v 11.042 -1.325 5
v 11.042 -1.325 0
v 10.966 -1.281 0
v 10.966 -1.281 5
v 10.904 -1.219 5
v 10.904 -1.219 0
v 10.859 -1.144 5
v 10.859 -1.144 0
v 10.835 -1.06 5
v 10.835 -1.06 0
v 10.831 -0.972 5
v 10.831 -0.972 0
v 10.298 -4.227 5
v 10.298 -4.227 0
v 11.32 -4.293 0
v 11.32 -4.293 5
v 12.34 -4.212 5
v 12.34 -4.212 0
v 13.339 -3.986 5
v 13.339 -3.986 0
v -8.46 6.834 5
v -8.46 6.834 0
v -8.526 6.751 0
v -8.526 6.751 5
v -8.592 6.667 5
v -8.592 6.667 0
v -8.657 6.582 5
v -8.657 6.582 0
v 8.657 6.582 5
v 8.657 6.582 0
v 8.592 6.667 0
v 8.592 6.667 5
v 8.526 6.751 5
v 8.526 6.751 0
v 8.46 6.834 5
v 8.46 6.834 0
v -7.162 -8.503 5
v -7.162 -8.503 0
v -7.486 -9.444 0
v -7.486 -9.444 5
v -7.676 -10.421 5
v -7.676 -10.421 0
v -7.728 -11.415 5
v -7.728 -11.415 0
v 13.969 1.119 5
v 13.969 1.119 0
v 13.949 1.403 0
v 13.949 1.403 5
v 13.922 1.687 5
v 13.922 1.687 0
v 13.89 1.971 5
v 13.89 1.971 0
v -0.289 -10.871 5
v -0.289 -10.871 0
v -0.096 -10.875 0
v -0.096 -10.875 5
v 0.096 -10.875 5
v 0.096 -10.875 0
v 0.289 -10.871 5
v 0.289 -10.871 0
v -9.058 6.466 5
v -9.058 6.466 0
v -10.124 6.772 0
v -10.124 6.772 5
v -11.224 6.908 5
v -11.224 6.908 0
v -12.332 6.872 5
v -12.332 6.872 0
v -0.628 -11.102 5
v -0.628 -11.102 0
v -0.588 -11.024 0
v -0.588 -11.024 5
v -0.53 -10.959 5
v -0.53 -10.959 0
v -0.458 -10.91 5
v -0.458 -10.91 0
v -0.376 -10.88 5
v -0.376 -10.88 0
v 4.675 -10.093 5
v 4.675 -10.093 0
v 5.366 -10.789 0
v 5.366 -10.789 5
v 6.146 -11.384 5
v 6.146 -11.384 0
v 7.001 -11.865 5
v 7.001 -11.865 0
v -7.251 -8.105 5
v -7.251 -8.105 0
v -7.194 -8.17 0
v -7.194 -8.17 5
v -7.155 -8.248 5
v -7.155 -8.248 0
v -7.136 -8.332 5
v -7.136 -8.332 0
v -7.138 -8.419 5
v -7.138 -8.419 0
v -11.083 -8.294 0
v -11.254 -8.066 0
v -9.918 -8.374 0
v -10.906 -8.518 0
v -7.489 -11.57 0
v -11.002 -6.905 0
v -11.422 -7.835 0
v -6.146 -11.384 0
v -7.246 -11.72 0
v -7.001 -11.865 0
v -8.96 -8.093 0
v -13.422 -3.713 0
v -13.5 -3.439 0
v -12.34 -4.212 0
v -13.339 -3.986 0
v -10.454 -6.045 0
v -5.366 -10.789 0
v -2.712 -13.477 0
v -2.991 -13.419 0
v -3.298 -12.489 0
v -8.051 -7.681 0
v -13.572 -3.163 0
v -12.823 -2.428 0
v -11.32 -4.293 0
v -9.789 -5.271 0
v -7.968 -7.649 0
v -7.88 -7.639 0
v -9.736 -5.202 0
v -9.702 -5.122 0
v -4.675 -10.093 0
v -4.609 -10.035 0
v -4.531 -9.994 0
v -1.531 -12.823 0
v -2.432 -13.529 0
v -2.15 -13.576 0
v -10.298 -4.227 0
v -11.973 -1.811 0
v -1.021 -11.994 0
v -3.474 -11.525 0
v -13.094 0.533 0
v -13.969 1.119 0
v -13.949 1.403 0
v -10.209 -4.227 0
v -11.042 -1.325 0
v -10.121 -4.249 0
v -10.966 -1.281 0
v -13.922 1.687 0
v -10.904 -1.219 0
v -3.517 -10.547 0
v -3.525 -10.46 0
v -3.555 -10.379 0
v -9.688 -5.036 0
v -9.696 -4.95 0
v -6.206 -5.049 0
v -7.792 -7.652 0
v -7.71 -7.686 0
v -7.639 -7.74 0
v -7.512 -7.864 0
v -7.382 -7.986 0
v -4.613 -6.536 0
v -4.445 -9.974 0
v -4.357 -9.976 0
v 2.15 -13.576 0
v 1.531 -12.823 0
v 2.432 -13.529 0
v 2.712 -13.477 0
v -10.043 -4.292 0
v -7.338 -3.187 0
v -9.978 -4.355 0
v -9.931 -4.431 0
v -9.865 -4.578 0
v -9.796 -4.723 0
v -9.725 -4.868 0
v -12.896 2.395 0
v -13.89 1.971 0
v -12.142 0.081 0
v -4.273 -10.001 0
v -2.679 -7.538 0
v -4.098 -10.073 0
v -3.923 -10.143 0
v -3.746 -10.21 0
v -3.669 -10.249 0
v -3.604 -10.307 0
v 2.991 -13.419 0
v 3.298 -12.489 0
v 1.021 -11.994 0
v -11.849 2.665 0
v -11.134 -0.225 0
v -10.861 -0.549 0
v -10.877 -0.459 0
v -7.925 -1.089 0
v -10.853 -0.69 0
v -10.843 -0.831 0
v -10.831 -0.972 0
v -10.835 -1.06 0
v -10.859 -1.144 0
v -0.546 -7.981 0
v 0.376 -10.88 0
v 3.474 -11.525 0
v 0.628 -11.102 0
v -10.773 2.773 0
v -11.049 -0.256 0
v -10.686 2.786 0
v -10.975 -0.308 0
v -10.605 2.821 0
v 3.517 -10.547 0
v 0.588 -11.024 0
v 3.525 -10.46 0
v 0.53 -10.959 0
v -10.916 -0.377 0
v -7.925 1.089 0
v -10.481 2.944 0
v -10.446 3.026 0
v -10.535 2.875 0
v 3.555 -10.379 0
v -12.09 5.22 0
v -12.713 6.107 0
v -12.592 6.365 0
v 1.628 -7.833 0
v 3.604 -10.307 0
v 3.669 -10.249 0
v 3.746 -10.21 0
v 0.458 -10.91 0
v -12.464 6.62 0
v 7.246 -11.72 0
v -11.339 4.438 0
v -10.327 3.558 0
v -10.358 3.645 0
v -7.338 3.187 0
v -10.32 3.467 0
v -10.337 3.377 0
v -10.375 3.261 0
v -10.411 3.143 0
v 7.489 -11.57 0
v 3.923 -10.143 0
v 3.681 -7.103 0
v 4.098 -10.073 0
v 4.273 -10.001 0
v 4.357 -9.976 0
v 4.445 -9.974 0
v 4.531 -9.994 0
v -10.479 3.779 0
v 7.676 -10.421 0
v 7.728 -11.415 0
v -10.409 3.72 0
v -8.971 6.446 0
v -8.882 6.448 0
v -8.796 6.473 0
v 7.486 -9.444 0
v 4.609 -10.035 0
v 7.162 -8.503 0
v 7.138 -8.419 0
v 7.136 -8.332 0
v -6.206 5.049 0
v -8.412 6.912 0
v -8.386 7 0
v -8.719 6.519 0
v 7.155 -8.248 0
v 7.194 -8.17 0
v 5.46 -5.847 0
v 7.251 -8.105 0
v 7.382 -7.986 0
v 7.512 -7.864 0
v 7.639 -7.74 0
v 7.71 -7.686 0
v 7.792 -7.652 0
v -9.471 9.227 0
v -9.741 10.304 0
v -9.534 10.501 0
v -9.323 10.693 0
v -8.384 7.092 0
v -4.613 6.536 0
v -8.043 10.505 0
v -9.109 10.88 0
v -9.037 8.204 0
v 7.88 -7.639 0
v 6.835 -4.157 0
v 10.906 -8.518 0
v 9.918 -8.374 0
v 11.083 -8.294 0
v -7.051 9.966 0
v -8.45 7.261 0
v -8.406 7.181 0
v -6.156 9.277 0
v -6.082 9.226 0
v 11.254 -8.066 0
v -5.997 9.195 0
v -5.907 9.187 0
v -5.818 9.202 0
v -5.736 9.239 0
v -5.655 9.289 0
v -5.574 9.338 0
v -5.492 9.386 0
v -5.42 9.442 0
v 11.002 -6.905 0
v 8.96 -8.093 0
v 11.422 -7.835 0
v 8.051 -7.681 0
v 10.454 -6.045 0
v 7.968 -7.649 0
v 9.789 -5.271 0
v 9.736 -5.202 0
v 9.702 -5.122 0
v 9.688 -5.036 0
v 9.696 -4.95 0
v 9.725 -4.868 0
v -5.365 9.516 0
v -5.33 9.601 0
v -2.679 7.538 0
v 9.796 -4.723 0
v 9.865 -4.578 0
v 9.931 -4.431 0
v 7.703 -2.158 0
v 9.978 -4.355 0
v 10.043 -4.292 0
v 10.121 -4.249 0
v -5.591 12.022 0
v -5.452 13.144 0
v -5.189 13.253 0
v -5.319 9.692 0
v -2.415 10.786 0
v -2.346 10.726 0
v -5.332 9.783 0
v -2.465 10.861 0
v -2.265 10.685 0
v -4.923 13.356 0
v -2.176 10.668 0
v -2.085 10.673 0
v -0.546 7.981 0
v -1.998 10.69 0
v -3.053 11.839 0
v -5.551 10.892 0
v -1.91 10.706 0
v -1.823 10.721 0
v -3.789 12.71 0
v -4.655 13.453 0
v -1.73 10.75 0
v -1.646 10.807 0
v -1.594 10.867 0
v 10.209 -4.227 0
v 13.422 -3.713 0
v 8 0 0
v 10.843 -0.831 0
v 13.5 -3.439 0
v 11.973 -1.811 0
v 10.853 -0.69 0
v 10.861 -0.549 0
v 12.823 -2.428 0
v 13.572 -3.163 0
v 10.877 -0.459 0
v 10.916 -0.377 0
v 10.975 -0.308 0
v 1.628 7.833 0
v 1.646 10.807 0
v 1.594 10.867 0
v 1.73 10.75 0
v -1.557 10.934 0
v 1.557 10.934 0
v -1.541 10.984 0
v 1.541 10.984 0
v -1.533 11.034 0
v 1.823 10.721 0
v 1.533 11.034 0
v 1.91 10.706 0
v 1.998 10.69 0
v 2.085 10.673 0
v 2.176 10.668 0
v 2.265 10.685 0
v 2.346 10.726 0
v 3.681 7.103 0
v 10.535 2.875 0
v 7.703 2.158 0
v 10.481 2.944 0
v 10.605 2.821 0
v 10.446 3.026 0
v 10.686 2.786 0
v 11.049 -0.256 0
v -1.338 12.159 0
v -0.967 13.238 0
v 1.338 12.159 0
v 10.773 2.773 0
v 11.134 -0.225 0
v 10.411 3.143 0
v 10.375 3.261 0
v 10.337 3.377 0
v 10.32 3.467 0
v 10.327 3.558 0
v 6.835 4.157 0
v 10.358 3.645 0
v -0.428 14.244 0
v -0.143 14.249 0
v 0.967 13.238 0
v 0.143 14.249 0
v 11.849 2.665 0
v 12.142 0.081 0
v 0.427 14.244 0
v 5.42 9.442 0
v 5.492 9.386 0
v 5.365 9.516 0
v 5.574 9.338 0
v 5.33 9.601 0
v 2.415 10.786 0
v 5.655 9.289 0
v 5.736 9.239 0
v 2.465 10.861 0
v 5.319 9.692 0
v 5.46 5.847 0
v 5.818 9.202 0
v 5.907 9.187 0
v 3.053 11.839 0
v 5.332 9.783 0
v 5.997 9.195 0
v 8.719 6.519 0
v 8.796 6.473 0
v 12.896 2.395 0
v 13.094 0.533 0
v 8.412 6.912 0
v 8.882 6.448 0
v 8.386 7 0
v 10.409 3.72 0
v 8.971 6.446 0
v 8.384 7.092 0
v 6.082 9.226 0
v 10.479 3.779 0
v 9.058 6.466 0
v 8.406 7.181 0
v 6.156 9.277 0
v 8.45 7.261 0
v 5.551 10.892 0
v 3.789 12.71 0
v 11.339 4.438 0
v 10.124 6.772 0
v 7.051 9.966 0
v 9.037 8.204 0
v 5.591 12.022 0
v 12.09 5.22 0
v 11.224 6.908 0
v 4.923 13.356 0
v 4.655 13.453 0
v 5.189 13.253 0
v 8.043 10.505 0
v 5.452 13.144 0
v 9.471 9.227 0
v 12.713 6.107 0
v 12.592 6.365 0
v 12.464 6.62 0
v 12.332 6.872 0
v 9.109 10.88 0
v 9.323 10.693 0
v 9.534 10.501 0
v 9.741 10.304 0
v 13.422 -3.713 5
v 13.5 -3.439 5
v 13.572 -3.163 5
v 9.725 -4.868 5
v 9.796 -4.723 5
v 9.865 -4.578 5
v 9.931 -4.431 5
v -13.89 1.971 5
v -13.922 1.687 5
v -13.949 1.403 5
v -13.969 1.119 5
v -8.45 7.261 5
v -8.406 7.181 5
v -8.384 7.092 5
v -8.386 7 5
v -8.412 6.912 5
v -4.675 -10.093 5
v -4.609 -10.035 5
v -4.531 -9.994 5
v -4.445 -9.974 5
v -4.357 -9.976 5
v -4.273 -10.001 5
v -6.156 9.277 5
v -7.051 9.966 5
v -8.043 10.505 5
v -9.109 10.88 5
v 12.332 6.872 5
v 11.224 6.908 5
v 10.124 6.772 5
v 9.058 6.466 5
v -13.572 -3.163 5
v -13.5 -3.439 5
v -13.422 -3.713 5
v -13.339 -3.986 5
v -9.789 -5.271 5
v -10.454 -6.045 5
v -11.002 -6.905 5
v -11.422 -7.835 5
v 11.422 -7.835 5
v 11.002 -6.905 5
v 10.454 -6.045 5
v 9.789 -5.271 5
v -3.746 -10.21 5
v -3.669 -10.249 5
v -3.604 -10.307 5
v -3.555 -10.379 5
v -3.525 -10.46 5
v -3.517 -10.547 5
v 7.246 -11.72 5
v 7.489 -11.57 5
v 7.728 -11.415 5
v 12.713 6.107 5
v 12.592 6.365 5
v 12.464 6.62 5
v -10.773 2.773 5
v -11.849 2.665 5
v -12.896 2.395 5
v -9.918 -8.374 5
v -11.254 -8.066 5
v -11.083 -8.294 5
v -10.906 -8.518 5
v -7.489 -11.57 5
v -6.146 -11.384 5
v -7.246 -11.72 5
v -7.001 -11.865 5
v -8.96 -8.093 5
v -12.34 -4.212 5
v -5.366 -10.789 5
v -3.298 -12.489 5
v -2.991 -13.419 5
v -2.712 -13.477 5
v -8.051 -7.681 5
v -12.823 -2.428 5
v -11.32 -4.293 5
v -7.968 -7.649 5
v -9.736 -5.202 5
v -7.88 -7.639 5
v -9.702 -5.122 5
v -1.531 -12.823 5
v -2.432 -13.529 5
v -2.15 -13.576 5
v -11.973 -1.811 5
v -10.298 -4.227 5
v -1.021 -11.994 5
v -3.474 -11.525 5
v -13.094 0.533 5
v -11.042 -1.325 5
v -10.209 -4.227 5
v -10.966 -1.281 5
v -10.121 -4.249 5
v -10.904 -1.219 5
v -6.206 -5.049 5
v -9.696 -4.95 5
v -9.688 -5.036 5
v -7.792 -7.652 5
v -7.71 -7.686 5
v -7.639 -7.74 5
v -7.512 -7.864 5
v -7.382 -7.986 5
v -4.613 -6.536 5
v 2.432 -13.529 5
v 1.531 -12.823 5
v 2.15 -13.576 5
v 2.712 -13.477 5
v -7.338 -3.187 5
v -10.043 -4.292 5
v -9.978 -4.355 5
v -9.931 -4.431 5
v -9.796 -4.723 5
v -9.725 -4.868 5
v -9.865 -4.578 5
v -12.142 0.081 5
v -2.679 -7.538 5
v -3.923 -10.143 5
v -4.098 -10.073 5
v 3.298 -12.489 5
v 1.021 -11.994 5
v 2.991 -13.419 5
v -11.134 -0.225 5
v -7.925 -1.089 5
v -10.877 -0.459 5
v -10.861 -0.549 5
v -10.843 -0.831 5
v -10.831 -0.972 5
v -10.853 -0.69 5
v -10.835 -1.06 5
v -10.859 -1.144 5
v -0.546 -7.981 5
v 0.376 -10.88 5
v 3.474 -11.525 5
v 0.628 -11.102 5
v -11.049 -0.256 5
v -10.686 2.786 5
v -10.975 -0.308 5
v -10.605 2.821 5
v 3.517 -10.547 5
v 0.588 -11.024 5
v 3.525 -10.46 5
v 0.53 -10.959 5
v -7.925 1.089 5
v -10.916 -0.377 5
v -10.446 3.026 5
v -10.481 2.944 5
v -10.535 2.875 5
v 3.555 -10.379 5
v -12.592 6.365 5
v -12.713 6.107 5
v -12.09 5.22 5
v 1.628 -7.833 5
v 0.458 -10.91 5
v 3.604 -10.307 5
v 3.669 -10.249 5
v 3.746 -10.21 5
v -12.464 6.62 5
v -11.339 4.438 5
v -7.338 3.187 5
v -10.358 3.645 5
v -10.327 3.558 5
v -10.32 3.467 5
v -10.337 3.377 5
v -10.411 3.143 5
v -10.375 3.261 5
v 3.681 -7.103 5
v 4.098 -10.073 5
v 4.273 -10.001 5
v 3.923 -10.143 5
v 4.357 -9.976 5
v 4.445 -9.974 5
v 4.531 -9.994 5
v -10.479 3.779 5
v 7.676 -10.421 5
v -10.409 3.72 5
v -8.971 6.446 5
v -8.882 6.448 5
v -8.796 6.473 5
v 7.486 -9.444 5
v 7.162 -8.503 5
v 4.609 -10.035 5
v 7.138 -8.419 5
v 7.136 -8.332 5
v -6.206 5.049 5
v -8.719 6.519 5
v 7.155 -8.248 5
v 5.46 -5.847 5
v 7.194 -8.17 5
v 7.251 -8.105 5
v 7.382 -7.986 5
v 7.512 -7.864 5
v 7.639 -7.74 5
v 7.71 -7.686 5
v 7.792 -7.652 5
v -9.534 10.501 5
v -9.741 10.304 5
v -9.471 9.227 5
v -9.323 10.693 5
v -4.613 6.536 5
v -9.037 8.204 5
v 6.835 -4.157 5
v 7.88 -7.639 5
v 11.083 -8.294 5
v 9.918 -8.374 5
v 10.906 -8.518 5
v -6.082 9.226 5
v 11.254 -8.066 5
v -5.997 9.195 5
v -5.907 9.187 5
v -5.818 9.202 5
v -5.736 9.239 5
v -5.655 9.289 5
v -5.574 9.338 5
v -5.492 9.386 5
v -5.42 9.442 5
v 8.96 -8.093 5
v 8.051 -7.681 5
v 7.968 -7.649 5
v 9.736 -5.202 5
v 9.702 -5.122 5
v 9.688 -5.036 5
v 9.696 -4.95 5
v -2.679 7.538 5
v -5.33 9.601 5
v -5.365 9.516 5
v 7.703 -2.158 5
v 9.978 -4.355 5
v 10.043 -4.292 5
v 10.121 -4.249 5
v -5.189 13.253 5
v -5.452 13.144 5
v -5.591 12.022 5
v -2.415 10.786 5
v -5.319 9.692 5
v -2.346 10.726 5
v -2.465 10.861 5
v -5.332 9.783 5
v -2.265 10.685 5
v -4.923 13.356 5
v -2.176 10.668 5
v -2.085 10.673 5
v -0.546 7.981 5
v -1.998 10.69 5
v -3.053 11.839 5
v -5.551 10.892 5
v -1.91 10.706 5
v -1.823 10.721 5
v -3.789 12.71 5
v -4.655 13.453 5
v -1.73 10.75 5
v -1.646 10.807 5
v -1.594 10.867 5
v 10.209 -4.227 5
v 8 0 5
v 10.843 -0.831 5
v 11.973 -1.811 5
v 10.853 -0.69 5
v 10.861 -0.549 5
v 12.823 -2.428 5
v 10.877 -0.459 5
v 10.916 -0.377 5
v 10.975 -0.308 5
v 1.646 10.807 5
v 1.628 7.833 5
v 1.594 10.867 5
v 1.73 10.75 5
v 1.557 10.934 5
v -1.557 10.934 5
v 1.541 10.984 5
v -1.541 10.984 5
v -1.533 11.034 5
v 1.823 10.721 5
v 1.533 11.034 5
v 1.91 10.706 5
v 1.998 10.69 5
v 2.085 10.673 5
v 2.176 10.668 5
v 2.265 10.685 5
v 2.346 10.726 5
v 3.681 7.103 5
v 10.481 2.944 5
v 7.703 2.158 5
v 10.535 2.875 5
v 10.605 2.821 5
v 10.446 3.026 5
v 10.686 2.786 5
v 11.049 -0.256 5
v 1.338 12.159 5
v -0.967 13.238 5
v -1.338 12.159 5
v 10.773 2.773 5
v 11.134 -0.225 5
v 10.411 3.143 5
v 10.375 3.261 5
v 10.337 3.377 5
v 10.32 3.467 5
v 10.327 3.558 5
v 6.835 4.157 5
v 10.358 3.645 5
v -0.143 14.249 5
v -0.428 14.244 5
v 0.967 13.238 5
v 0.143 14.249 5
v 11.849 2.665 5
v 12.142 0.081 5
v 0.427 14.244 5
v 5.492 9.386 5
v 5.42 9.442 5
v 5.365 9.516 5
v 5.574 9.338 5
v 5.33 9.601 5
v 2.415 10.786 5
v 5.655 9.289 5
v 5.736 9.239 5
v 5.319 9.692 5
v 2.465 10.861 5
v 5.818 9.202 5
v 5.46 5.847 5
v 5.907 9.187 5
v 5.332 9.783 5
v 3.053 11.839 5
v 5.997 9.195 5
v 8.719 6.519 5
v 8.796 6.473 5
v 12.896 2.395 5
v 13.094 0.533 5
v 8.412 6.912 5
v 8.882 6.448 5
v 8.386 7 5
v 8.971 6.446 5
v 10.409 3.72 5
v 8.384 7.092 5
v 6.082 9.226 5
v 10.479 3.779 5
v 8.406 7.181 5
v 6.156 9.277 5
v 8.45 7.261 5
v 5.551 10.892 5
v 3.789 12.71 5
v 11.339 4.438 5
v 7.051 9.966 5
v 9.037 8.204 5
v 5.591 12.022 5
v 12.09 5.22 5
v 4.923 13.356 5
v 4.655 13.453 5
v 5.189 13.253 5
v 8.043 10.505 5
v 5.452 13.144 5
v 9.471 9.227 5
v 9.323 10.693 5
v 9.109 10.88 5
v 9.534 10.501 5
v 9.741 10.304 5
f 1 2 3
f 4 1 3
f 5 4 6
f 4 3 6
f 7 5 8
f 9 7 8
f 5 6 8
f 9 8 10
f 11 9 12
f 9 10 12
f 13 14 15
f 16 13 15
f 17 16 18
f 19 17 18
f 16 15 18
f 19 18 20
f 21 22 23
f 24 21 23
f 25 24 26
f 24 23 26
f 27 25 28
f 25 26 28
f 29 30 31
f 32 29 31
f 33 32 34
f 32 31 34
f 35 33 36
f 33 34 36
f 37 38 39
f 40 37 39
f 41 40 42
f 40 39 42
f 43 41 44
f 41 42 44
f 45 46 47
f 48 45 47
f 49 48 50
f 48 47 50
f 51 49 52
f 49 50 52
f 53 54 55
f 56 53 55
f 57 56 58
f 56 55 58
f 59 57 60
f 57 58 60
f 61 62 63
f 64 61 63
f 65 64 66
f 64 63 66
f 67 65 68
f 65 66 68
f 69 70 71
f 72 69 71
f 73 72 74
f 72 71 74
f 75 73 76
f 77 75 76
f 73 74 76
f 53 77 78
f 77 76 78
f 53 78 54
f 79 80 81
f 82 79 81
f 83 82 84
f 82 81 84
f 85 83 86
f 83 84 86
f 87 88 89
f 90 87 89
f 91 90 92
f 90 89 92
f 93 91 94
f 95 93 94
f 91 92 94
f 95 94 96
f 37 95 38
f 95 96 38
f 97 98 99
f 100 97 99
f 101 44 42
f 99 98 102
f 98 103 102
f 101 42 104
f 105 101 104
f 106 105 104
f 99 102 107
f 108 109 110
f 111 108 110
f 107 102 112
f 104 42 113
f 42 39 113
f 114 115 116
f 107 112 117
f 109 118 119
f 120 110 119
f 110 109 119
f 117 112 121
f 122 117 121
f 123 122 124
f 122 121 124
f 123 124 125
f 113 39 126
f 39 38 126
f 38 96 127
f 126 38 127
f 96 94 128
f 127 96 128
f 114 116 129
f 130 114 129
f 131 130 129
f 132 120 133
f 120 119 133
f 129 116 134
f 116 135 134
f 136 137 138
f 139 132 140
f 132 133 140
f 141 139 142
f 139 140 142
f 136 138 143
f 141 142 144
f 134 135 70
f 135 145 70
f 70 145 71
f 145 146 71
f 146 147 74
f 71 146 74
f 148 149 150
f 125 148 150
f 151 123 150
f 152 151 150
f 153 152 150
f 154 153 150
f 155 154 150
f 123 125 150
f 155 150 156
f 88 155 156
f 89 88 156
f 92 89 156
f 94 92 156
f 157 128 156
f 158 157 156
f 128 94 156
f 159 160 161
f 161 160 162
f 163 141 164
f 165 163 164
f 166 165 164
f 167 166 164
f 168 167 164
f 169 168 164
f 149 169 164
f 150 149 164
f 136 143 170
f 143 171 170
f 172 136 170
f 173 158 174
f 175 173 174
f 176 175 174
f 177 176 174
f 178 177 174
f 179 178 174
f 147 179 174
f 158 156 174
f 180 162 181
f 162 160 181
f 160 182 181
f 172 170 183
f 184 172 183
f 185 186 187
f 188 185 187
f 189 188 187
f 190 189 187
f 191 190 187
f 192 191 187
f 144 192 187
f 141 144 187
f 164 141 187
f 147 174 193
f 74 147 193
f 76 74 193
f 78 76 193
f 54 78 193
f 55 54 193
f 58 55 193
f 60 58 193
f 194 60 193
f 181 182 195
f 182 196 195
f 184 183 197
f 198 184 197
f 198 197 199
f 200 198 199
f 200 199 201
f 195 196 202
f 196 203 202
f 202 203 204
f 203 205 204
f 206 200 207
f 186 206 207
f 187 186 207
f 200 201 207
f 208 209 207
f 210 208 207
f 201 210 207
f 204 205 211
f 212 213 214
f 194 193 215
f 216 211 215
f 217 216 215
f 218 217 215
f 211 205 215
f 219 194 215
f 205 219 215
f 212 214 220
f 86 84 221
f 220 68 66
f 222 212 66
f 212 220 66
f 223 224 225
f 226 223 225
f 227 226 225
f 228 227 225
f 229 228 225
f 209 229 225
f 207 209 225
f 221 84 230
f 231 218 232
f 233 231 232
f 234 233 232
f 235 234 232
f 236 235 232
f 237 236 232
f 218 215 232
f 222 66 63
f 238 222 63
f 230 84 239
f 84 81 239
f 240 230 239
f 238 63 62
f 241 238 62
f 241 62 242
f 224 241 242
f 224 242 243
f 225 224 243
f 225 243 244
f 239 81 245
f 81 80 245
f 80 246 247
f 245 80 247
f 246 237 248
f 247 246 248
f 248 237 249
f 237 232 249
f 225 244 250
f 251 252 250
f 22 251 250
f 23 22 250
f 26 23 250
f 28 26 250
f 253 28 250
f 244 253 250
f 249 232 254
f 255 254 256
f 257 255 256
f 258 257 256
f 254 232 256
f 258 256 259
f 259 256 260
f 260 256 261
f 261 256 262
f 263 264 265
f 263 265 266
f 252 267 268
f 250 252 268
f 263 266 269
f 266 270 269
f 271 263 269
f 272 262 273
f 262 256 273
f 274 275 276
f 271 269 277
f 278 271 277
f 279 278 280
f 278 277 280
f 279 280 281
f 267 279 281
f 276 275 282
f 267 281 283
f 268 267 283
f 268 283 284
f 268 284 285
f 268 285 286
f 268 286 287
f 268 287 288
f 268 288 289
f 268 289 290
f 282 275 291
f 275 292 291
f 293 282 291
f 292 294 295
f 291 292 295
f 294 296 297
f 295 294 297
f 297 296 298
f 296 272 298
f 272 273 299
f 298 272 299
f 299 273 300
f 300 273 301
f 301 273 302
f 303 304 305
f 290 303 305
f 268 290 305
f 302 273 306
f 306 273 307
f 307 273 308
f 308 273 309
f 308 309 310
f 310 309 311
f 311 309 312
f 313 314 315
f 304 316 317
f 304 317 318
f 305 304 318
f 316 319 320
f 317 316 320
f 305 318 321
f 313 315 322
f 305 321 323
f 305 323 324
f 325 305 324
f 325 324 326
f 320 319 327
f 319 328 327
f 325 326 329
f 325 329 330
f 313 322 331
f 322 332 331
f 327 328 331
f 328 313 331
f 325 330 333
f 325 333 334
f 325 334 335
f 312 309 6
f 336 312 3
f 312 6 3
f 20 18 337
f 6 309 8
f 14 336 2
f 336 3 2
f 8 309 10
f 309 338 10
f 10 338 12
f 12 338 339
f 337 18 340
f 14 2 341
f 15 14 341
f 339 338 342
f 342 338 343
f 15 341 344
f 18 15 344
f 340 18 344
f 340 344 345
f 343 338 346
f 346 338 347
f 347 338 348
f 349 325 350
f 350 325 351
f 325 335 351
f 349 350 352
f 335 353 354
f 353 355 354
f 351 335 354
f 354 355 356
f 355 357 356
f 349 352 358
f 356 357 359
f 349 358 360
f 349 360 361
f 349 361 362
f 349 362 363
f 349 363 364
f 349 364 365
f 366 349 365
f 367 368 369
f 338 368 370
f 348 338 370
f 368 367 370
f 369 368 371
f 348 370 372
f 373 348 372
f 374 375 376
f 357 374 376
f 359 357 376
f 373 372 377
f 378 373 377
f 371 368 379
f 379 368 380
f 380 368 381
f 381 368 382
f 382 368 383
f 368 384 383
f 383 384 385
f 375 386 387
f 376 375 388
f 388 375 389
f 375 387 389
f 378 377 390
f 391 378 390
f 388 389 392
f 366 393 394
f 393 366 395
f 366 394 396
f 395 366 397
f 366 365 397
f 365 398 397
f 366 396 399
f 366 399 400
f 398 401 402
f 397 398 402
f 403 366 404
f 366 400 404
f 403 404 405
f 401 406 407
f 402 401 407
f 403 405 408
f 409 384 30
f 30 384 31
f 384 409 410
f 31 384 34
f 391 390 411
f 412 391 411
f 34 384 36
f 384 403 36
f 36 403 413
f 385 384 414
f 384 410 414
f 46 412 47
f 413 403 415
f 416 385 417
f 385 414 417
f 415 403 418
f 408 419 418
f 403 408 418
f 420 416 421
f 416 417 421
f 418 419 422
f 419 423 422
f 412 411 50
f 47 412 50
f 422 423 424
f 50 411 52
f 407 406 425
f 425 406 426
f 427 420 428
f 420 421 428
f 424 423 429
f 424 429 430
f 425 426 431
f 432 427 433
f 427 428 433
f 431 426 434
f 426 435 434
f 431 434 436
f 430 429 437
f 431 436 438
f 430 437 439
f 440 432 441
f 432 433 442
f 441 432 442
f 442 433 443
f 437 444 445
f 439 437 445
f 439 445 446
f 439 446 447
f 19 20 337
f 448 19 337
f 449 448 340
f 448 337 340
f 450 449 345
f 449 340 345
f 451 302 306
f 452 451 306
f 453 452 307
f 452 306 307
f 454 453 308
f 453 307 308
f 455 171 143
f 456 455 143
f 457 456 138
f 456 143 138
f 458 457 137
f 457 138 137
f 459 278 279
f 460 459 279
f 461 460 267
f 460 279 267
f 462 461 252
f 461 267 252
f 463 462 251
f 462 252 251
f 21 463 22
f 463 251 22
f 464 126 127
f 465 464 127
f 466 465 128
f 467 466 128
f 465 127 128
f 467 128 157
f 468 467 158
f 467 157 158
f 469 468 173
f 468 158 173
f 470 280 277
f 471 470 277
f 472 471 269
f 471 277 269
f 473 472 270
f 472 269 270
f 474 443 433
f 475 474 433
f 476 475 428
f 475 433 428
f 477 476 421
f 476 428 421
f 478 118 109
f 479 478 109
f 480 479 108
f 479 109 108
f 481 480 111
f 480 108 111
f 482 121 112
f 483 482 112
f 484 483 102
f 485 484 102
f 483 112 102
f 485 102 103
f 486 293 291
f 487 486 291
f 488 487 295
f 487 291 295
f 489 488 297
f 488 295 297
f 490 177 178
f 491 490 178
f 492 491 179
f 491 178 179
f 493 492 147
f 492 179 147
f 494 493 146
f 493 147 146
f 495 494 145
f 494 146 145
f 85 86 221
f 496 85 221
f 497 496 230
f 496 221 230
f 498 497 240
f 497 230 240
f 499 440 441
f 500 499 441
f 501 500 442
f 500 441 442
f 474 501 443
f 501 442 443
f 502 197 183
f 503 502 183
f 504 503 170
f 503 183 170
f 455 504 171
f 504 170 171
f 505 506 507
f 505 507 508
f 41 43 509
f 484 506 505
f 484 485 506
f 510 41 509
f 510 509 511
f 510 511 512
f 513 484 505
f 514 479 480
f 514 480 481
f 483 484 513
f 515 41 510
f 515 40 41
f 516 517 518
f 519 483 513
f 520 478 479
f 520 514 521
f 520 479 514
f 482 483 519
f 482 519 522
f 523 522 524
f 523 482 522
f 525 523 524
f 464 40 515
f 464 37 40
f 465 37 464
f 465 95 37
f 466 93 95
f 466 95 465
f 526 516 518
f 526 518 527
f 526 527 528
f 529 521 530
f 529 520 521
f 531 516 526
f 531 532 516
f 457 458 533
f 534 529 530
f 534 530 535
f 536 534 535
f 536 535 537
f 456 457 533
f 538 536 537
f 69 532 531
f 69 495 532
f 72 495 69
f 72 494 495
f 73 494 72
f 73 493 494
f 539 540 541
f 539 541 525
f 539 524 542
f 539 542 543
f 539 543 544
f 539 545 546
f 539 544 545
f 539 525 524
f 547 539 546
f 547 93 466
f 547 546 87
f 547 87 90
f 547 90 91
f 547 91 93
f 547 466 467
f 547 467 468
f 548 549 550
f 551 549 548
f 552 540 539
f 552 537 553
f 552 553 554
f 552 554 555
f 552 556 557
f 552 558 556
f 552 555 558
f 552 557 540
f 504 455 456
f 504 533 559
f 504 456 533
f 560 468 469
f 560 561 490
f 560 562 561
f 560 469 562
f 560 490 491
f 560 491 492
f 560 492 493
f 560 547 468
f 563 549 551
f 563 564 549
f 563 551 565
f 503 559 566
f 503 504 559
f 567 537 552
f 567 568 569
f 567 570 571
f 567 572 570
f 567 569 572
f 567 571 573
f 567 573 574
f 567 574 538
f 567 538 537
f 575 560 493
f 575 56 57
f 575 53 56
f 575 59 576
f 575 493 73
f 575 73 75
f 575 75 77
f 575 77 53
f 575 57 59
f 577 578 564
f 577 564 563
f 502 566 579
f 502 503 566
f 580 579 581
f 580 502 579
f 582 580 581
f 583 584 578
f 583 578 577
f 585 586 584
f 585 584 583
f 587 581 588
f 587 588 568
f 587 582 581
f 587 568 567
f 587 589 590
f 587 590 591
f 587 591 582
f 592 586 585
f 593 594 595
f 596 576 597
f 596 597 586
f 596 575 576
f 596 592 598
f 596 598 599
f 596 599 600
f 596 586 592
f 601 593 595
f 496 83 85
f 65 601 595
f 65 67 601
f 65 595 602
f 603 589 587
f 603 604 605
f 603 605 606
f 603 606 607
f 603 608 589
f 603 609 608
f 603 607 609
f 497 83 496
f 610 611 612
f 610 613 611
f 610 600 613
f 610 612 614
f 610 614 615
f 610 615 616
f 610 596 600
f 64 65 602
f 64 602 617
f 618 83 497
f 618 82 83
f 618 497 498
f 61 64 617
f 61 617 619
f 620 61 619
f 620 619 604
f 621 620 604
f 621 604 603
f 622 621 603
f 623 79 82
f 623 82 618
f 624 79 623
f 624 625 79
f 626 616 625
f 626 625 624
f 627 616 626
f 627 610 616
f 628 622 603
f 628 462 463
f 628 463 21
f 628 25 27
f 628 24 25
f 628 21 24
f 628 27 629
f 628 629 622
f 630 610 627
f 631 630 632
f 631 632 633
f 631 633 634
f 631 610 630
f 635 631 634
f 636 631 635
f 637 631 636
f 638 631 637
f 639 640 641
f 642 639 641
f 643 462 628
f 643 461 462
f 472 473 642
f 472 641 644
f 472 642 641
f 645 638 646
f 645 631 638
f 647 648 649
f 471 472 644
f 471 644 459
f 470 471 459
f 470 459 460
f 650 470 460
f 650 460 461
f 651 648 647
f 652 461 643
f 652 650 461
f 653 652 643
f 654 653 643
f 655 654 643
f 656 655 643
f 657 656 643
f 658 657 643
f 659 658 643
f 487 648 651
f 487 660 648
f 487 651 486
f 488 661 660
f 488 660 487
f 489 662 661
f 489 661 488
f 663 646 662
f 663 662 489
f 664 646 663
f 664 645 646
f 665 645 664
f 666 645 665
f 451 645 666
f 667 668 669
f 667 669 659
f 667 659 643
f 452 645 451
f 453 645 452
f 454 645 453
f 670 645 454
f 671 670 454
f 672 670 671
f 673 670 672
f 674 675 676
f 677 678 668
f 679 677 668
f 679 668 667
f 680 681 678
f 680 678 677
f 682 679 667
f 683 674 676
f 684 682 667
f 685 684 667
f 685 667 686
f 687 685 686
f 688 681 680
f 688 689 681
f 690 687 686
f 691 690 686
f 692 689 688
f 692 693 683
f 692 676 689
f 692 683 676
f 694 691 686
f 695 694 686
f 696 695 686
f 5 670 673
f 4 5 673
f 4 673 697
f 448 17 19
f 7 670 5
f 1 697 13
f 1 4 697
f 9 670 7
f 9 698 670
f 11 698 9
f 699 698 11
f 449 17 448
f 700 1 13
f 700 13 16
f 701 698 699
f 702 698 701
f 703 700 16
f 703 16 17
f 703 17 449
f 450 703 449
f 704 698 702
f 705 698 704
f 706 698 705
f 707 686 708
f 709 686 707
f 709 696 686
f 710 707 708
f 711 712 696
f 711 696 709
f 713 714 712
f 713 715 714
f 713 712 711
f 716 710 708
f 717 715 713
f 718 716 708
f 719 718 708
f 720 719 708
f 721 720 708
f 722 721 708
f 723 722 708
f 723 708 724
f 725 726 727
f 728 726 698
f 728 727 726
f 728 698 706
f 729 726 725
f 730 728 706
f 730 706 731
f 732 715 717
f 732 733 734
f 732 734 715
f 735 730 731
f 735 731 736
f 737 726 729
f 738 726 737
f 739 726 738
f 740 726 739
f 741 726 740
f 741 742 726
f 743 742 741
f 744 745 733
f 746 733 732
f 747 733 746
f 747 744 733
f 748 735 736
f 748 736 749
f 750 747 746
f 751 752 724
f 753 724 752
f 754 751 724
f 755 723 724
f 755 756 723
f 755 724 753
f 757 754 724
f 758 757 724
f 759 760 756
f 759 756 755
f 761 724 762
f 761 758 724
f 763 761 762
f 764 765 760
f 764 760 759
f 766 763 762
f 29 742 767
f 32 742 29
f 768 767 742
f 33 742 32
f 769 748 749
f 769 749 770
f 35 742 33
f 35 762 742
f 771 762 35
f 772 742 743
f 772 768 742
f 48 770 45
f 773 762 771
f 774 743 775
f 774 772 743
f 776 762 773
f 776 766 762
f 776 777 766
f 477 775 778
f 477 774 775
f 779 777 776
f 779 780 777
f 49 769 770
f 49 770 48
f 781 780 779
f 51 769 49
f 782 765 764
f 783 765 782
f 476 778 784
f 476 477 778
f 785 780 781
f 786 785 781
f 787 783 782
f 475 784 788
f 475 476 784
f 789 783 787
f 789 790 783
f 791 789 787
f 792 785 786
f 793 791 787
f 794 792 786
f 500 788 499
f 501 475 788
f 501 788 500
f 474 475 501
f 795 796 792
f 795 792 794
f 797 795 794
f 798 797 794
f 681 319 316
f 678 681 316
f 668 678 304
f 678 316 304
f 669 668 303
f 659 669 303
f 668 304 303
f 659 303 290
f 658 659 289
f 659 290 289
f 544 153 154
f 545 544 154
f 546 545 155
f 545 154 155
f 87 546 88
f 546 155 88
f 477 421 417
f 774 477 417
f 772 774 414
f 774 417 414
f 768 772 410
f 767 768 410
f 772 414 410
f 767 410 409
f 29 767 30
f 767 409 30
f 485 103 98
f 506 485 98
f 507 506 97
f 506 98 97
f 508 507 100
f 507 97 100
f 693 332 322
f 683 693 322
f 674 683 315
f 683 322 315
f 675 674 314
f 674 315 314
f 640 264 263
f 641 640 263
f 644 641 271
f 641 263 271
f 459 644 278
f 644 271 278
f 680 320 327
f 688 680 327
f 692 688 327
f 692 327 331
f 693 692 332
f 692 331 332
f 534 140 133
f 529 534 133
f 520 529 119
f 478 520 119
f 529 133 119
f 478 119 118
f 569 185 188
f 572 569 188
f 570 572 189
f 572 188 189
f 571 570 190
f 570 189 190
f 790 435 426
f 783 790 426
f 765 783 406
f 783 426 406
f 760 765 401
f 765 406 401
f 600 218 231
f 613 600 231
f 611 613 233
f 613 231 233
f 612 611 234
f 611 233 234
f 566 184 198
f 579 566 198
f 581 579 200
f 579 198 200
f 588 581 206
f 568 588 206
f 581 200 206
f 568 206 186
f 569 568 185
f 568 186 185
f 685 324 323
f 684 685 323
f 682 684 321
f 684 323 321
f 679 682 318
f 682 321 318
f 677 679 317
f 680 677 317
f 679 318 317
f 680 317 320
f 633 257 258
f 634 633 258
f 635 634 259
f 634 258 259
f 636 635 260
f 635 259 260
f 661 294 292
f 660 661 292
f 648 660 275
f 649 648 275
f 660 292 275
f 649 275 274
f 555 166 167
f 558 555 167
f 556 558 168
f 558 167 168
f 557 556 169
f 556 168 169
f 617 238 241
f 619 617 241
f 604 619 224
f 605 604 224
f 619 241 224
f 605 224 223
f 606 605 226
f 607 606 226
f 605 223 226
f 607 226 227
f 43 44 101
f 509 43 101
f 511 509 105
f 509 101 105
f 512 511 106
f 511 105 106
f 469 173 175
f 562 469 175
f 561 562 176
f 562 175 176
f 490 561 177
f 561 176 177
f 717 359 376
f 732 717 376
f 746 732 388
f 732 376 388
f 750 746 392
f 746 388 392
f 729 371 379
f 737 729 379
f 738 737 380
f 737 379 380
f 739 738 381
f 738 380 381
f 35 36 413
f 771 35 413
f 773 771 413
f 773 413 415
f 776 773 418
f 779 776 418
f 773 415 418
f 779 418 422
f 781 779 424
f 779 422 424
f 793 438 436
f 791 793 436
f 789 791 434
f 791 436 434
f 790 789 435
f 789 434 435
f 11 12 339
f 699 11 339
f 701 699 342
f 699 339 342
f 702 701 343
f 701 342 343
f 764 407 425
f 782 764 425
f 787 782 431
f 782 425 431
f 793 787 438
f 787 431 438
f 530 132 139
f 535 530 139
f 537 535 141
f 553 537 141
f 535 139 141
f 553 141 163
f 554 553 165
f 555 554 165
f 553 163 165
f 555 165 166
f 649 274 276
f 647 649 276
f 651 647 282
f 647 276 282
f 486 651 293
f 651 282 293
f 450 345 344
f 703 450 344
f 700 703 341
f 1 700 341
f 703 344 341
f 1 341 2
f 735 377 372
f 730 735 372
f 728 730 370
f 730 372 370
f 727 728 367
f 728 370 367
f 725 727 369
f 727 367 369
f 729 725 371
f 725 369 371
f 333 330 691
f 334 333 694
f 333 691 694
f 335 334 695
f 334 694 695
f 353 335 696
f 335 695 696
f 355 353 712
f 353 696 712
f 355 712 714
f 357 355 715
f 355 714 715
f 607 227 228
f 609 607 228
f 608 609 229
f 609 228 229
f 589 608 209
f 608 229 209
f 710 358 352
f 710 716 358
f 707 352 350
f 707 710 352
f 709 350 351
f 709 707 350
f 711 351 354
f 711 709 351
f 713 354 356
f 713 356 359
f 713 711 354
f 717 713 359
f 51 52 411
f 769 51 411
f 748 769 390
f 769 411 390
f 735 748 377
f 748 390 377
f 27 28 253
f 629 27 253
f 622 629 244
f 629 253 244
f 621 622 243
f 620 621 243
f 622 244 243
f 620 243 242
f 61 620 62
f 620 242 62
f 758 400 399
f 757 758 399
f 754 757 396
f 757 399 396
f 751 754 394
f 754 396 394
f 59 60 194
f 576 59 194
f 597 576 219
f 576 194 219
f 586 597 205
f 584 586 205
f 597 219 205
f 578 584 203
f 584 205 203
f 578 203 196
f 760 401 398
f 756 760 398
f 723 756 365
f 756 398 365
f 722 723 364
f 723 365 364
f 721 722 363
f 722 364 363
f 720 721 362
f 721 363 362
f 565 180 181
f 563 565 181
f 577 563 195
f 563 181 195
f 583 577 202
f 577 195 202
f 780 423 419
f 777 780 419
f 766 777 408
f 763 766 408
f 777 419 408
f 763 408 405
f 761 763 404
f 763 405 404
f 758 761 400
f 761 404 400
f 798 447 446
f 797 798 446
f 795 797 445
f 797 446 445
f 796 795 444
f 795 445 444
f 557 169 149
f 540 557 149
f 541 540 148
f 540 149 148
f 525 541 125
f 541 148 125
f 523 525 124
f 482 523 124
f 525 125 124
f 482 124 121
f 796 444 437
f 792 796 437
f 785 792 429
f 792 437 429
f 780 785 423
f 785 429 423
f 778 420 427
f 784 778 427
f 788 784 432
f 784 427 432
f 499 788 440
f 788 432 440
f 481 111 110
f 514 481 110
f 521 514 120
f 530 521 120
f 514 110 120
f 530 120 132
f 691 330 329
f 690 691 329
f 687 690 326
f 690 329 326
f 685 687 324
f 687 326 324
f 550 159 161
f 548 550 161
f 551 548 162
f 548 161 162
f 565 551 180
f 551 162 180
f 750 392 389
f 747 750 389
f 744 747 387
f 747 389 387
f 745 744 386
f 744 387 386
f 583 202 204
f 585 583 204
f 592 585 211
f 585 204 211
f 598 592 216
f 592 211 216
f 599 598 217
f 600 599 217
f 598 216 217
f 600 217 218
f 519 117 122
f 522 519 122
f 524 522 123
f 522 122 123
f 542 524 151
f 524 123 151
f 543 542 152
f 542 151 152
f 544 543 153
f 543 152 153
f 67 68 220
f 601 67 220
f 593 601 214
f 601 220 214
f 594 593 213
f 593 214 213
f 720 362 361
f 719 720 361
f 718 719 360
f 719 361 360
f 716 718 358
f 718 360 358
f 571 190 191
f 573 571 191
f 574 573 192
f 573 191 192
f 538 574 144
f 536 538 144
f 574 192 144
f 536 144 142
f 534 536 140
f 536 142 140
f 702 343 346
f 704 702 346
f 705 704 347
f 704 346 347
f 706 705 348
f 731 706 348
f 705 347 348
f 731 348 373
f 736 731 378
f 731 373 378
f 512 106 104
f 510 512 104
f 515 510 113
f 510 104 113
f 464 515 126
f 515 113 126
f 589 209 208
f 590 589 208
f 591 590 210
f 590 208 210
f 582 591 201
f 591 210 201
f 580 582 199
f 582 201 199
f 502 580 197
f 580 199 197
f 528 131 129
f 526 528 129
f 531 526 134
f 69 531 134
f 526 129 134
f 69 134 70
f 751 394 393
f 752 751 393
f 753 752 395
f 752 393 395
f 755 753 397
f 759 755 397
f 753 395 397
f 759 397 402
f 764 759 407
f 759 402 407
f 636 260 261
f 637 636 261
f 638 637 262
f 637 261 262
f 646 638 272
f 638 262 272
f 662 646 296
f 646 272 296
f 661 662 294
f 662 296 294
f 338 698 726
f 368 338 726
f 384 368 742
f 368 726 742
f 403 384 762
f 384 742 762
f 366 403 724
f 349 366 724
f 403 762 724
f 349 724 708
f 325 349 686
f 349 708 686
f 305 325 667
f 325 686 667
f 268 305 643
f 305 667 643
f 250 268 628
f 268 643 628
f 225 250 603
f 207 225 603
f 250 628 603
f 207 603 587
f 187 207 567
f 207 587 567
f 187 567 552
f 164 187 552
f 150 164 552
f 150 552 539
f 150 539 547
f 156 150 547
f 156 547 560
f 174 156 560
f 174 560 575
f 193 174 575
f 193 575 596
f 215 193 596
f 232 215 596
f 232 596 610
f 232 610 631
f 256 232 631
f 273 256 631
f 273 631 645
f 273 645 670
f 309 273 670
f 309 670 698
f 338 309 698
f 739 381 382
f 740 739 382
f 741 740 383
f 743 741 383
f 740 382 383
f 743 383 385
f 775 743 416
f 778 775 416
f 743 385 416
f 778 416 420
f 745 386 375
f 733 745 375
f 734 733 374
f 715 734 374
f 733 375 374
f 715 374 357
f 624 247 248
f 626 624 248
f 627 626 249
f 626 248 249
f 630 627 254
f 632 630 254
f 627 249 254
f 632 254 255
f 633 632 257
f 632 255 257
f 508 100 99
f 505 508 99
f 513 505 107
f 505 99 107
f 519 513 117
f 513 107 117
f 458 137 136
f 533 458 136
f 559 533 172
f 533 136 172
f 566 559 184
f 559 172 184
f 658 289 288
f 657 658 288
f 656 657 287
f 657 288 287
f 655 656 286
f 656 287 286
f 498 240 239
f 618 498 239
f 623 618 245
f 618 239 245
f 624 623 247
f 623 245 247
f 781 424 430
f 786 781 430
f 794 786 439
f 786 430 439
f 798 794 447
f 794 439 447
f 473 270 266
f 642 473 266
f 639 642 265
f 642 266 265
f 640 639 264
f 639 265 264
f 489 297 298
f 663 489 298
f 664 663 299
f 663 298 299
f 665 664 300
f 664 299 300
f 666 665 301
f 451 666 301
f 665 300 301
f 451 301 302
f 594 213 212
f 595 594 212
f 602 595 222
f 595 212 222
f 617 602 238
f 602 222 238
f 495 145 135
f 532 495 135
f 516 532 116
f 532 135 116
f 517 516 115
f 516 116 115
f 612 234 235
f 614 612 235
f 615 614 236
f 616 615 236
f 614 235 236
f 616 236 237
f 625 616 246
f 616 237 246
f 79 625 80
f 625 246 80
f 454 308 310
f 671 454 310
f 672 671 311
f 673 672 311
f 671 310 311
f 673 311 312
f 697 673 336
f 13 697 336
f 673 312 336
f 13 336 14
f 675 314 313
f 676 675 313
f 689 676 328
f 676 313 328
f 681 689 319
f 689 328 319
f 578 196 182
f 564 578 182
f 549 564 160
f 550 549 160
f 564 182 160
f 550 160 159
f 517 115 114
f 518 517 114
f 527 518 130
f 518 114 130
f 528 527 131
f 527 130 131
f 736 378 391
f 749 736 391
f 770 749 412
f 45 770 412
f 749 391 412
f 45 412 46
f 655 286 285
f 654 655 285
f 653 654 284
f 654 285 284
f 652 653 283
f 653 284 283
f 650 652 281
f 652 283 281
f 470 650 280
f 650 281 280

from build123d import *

# Parameters (mm, degrees)
SKETCH_1_R               = 10.875
EXTRUDE_1_DEPTH          = 5
EXTRUDE_2_DEPTH          = 5
FILLET_1_R               = 0.35
PATTERN_CIRCULAR_1_DEPTH = 5
CUT_EXTRUDE_1_REACH      = 22.572
SKETCH_2_R               = 8


# Read off the part's stored shape, not the designer's step: 원형 패턴1
with BuildPart() as part:
    # 스케치1 → 보스-돌출1 (new body)
    with BuildSketch(Plane.XY):
        Circle(SKETCH_1_R)
    extrude(amount=EXTRUDE_1_DEPTH)

    # 스케치1<3> → 보스-돌출2 (add)
    with BuildSketch(Plane.XY):
        with BuildLine():
            ThreePointArc((1.5525, 10.763613183), (1.216970842, 12.576974386), (0.4275, 14.243586057))
            ThreePointArc((0.4275, 14.243586057), (0, 14.25), (-0.4275, 14.243586057))
            ThreePointArc((-0.4275, 14.243586057), (-1.216970842, 12.576974386), (-1.5525, 10.763613183))
            ThreePointArc((-1.5525, 10.763613183), (0, 10.875), (1.5525, 10.763613183))
        make_face()
    extrude(amount=EXTRUDE_2_DEPTH)

    # 필렛1
    fillet_1_edges = [part.edges().sort_by_distance(p)[0] for p in [
        (-1.5525, 10.763613183, 2.5),
        (1.5525, 10.763613183, 2.5),
    ]]
    fillet(fillet_1_edges, radius=FILLET_1_R)

    # 원형 패턴1 outline → 원형 패턴1 (add)
    with BuildSketch(Plane.XY):
        with BuildLine():
            ThreePointArc((2.084837088, 10.673288121), (3.842906104, 10.173381821), (5.492422476, 9.386102511))
            ThreePointArc((5.492422476, 9.386102511), (5.344646109, 9.557145045), (5.332233471, 9.782842475))
            ThreePointArc((5.332233471, 9.782842475), (5.593355494, 11.4564781), (5.452236305, 13.144472855))
            ThreePointArc((5.452236305, 13.144472855), (5.055921411, 13.304884491), (4.654972549, 13.453334479))
            ThreePointArc((4.654972549, 13.453334479), (3.403689946, 12.289385973), (2.465385752, 10.861075951))
            ThreePointArc((2.465385752, 10.861075951), (2.306817266, 10.702930709), (2.084837088, 10.673288121))
        make_face()
        with BuildLine():
            ThreePointArc((5.736195698, 9.2391387), (7.199095251, 8.150990895), (8.459646862, 6.833739823))
            ThreePointArc((8.459646862, 6.833739823), (8.381997736, 7.045900933), (8.450146114, 7.261301773))
            ThreePointArc((8.450146114, 7.261301773), (9.274201483, 8.707038787), (9.740617886, 10.304436202))
            ThreePointArc((9.740617886, 10.304436202), (9.42901262, 10.597181051), (9.108765262, 10.880445977))
            ThreePointArc((9.108765262, 10.880445977), (7.536352291, 10.255192371), (6.155612256, 9.27693802))
            ThreePointArc((6.155612256, 9.27693802), (5.952224819, 9.187903085), (5.736195698, 9.2391387))
        make_face()
        with BuildLine():
            ThreePointArc((8.656847778, 6.582143386), (9.631277253, 5.050160738), (10.337248772, 3.377412148))
            ThreePointArc((10.337248772, 3.377412148), (10.339832595, 3.602419922), (10.478866532, 3.779351375))
            ThreePointArc((10.478866532, 3.779351375), (11.729603042, 4.815098477), (12.713475046, 6.107038785))
            ThreePointArc((12.713475046, 6.107038785), (12.528663426, 6.492580033), (12.332368752, 6.872403399))
            ThreePointArc((12.332368752, 6.872403399), (10.671238348, 6.86130469), (9.057778331, 6.466052652))
            ThreePointArc((9.057778331, 6.466052652), (8.838113972, 6.457792134), (8.656847778, 6.582143386))
        make_face()
        with BuildLine():
            ThreePointArc((10.44566348, 3.025514743), (10.802249116, 1.255802147), (10.861158072, -0.548516485))
            ThreePointArc((10.861158072, -0.548516485), (10.943077602, -0.34062274), (11.134084318, -0.224661311))
            ThreePointArc((11.134084318, -0.224661311), (12.626546762, 0.289328326), (13.969306954, 1.119162384))
            ThreePointArc((13.969306954, 1.119162384), (13.936248813, 1.545430549), (13.890417506, 1.970515105))
            ThreePointArc((13.890417506, 1.970515105), (12.377771936, 2.549980076), (10.773358461, 2.772990553))
            ThreePointArc((10.773358461, 2.772990553), (10.568207288, 2.845653785), (10.44566348, 3.025514743))
        make_face()
        with BuildLine():
            ThreePointArc((10.831434222, -0.972449329), (10.524388312, -2.739137757), (9.931200049, -4.431353133))
            ThreePointArc((9.931200049, -4.431353133), (10.080749628, -4.26807205), (10.298365111, -4.227215102))
            ThreePointArc((10.298365111, -4.227215102), (11.831510548, -4.270865326), (13.338506551, -3.985552654))
            ThreePointArc((13.338506551, -3.985552654), (13.461666574, -3.57612745), (13.572488407, -3.163191729))
            ThreePointArc((13.572488407, -3.163191729), (12.409057254, -2.103647039), (11.041512467, -1.325168872))
            ThreePointArc((11.041512467, -1.325168872), (10.879326869, -1.182845296), (10.831434222, -0.972449329))
        make_face()
        with BuildLine():
            ThreePointArc((9.724818044, -4.867600951), (8.799895988, -6.389636578), (7.638946645, -7.74029193))
            ThreePointArc((7.638946645, -7.74029193), (7.835322049, -7.642919348), (8.051101932, -7.68143897))
            ThreePointArc((8.051101932, -7.68143897), (9.434573038, -8.250170344), (10.906266927, -8.517686277))
            ThreePointArc((10.906266927, -8.517686277), (11.169011671, -8.180399177), (11.421519541, -7.835381548))
            ThreePointArc((11.421519541, -7.835381548), (10.743744256, -6.465085659), (9.78938361, -5.27081353))
            ThreePointArc((9.78938361, -5.27081353), (9.692203368, -5.079599132), (9.724818044, -4.867600951))
        make_face()
        with BuildLine():
            ThreePointArc((7.250855805, -8.104980882), (5.839114845, -9.174440736), (4.272503154, -10.000567074))
            ThreePointArc((4.272503154, -10.000567074), (4.488726043, -9.981391229), (4.674670149, -10.09339498))
            ThreePointArc((4.674670149, -10.09339498), (5.746046713, -11.099844355), (7.00107552, -11.865148727))
            ThreePointArc((7.00107552, -11.865148727), (7.367919852, -11.645552222), (7.728011172, -11.415049228))
            ThreePointArc((7.728011172, -11.415049228), (7.598229184, -9.929070664), (7.162058655, -8.502630716))
            ThreePointArc((7.162058655, -8.502630716), (7.142629708, -8.289552802), (7.250855805, -8.104980882))
        make_face()
        with BuildLine():
            ThreePointArc((3.745858716, -10.209513577), (2.04453627, -10.681081239), (0.289330355, -10.871150489))
            ThreePointArc((0.289330355, -10.871150489), (0.495925275, -10.93192564), (0.627834307, -11.102146342))
            ThreePointArc((0.627834307, -11.102146342), (1.261761796, -12.417365945), (2.150350071, -13.57584665))
            ThreePointArc((2.150350071, -13.57584665), (2.57174963, -13.503598465), (2.990792071, -13.418740812))
            ThreePointArc((2.990792071, -13.418740812), (3.40225572, -12.010026536), (3.516526006, -10.546906395))
            ThreePointArc((3.516526006, -10.546906395), (3.576953157, -10.341342504), (3.745858716, -10.209513577))
        make_face()
        with BuildLine():
            ThreePointArc((-0.289330355, -10.871150489), (-2.04453627, -10.681081239), (-3.745858716, -10.209513577))
            ThreePointArc((-3.745858716, -10.209513577), (-3.576953157, -10.341342504), (-3.516526006, -10.546906395))
            ThreePointArc((-3.516526006, -10.546906395), (-3.40225572, -12.010026536), (-2.990792071, -13.418740812))
            ThreePointArc((-2.990792071, -13.418740812), (-2.57174963, -13.503598465), (-2.150350071, -13.57584665))
            ThreePointArc((-2.150350071, -13.57584665), (-1.261761796, -12.417365945), (-0.627834307, -11.102146342))
            ThreePointArc((-0.627834307, -11.102146342), (-0.495925275, -10.93192564), (-0.289330355, -10.871150489))
        make_face()
        with BuildLine():
            ThreePointArc((-4.272503154, -10.000567074), (-5.839114845, -9.174440736), (-7.250855805, -8.104980882))
            ThreePointArc((-7.250855805, -8.104980882), (-7.142629708, -8.289552802), (-7.162058655, -8.502630716))
            ThreePointArc((-7.162058655, -8.502630716), (-7.598229184, -9.929070664), (-7.728011172, -11.415049228))
            ThreePointArc((-7.728011172, -11.415049228), (-7.367919852, -11.645552222), (-7.00107552, -11.865148727))
            ThreePointArc((-7.00107552, -11.865148727), (-5.746046713, -11.099844355), (-4.674670149, -10.09339498))
            ThreePointArc((-4.674670149, -10.09339498), (-4.488726043, -9.981391229), (-4.272503154, -10.000567074))
        make_face()
        with BuildLine():
            ThreePointArc((-7.638946645, -7.74029193), (-8.799895988, -6.389636578), (-9.724818044, -4.867600951))
            ThreePointArc((-9.724818044, -4.867600951), (-9.692203368, -5.079599132), (-9.78938361, -5.27081353))
            ThreePointArc((-9.78938361, -5.27081353), (-10.743744256, -6.465085659), (-11.421519541, -7.835381548))
            ThreePointArc((-11.421519541, -7.835381548), (-11.169011671, -8.180399177), (-10.906266927, -8.517686277))
            ThreePointArc((-10.906266927, -8.517686277), (-9.434573038, -8.250170344), (-8.051101932, -7.68143897))
            ThreePointArc((-8.051101932, -7.68143897), (-7.835322049, -7.642919348), (-7.638946645, -7.74029193))
        make_face()
        with BuildLine():
            ThreePointArc((-9.931200049, -4.431353133), (-10.524388312, -2.739137757), (-10.831434222, -0.972449329))
            ThreePointArc((-10.831434222, -0.972449329), (-10.879326869, -1.182845296), (-11.041512467, -1.325168872))
            ThreePointArc((-11.041512467, -1.325168872), (-12.409057254, -2.103647039), (-13.572488407, -3.163191729))
            ThreePointArc((-13.572488407, -3.163191729), (-13.461666574, -3.57612745), (-13.338506551, -3.985552654))
            ThreePointArc((-13.338506551, -3.985552654), (-11.831510548, -4.270865326), (-10.298365111, -4.227215102))
            ThreePointArc((-10.298365111, -4.227215102), (-10.080749628, -4.26807205), (-9.931200049, -4.431353133))
        make_face()
        with BuildLine():
            ThreePointArc((-10.861158072, -0.548516485), (-10.802249116, 1.255802147), (-10.44566348, 3.025514743))
            ThreePointArc((-10.44566348, 3.025514743), (-10.568207288, 2.845653785), (-10.773358461, 2.772990553))
            ThreePointArc((-10.773358461, 2.772990553), (-12.377771936, 2.549980076), (-13.890417506, 1.970515105))
            ThreePointArc((-13.890417506, 1.970515105), (-13.936248813, 1.545430549), (-13.969306954, 1.119162384))
            ThreePointArc((-13.969306954, 1.119162384), (-12.626546762, 0.289328326), (-11.134084318, -0.224661311))
            ThreePointArc((-11.134084318, -0.224661311), (-10.943077602, -0.34062274), (-10.861158072, -0.548516485))
        make_face()
        with BuildLine():
            ThreePointArc((-10.337248772, 3.377412148), (-9.631277253, 5.050160738), (-8.656847778, 6.582143386))
            ThreePointArc((-8.656847778, 6.582143386), (-8.838113972, 6.457792134), (-9.057778331, 6.466052652))
            ThreePointArc((-9.057778331, 6.466052652), (-10.671238348, 6.86130469), (-12.332368752, 6.872403399))
            ThreePointArc((-12.332368752, 6.872403399), (-12.528663426, 6.492580033), (-12.713475046, 6.107038785))
            ThreePointArc((-12.713475046, 6.107038785), (-11.729603042, 4.815098477), (-10.478866532, 3.779351375))
            ThreePointArc((-10.478866532, 3.779351375), (-10.339832595, 3.602419922), (-10.337248772, 3.377412148))
        make_face()
        with BuildLine():
            ThreePointArc((-8.459646862, 6.833739823), (-7.199095251, 8.150990895), (-5.736195698, 9.2391387))
            ThreePointArc((-5.736195698, 9.2391387), (-5.952224819, 9.187903085), (-6.155612256, 9.27693802))
            ThreePointArc((-6.155612256, 9.27693802), (-7.536352291, 10.255192371), (-9.108765262, 10.880445977))
            ThreePointArc((-9.108765262, 10.880445977), (-9.42901262, 10.597181051), (-9.740617886, 10.304436202))
            ThreePointArc((-9.740617886, 10.304436202), (-9.274201483, 8.707038787), (-8.450146114, 7.261301773))
            ThreePointArc((-8.450146114, 7.261301773), (-8.381997736, 7.045900933), (-8.459646862, 6.833739823))
        make_face()
        with BuildLine():
            ThreePointArc((-2.465385752, 10.861075951), (-3.403689946, 12.289385973), (-4.654972549, 13.453334479))
            ThreePointArc((-4.654972549, 13.453334479), (-5.055921411, 13.304884491), (-5.452236305, 13.144472855))
            ThreePointArc((-5.452236305, 13.144472855), (-5.593355494, 11.4564781), (-5.332233471, 9.782842475))
            ThreePointArc((-5.332233471, 9.782842475), (-5.344646109, 9.557145045), (-5.492422476, 9.386102511))
            ThreePointArc((-5.492422476, 9.386102511), (-3.842906104, 10.173381821), (-2.084837088, 10.673288121))
            ThreePointArc((-2.084837088, 10.673288121), (-2.306817266, 10.702930709), (-2.465385752, 10.861075951))
        make_face()
    extrude(amount=PATTERN_CIRCULAR_1_DEPTH)

    # 스케치2 → 컷-돌출1 (cut, up to next)
    with BuildSketch(Plane.XY.offset(5), mode=Mode.PRIVATE) as cut_extrude_1_sk1:
        Circle(SKETCH_2_R)
    cut_extrude_1_tool1 = extrude(cut_extrude_1_sk1.sketch, amount=-CUT_EXTRUDE_1_REACH, mode=Mode.PRIVATE) & part.part
    add(cut_extrude_1_tool1.solids().sort_by_distance((0, 0, 5))[0], mode=Mode.SUBTRACT)


solid = part.part
